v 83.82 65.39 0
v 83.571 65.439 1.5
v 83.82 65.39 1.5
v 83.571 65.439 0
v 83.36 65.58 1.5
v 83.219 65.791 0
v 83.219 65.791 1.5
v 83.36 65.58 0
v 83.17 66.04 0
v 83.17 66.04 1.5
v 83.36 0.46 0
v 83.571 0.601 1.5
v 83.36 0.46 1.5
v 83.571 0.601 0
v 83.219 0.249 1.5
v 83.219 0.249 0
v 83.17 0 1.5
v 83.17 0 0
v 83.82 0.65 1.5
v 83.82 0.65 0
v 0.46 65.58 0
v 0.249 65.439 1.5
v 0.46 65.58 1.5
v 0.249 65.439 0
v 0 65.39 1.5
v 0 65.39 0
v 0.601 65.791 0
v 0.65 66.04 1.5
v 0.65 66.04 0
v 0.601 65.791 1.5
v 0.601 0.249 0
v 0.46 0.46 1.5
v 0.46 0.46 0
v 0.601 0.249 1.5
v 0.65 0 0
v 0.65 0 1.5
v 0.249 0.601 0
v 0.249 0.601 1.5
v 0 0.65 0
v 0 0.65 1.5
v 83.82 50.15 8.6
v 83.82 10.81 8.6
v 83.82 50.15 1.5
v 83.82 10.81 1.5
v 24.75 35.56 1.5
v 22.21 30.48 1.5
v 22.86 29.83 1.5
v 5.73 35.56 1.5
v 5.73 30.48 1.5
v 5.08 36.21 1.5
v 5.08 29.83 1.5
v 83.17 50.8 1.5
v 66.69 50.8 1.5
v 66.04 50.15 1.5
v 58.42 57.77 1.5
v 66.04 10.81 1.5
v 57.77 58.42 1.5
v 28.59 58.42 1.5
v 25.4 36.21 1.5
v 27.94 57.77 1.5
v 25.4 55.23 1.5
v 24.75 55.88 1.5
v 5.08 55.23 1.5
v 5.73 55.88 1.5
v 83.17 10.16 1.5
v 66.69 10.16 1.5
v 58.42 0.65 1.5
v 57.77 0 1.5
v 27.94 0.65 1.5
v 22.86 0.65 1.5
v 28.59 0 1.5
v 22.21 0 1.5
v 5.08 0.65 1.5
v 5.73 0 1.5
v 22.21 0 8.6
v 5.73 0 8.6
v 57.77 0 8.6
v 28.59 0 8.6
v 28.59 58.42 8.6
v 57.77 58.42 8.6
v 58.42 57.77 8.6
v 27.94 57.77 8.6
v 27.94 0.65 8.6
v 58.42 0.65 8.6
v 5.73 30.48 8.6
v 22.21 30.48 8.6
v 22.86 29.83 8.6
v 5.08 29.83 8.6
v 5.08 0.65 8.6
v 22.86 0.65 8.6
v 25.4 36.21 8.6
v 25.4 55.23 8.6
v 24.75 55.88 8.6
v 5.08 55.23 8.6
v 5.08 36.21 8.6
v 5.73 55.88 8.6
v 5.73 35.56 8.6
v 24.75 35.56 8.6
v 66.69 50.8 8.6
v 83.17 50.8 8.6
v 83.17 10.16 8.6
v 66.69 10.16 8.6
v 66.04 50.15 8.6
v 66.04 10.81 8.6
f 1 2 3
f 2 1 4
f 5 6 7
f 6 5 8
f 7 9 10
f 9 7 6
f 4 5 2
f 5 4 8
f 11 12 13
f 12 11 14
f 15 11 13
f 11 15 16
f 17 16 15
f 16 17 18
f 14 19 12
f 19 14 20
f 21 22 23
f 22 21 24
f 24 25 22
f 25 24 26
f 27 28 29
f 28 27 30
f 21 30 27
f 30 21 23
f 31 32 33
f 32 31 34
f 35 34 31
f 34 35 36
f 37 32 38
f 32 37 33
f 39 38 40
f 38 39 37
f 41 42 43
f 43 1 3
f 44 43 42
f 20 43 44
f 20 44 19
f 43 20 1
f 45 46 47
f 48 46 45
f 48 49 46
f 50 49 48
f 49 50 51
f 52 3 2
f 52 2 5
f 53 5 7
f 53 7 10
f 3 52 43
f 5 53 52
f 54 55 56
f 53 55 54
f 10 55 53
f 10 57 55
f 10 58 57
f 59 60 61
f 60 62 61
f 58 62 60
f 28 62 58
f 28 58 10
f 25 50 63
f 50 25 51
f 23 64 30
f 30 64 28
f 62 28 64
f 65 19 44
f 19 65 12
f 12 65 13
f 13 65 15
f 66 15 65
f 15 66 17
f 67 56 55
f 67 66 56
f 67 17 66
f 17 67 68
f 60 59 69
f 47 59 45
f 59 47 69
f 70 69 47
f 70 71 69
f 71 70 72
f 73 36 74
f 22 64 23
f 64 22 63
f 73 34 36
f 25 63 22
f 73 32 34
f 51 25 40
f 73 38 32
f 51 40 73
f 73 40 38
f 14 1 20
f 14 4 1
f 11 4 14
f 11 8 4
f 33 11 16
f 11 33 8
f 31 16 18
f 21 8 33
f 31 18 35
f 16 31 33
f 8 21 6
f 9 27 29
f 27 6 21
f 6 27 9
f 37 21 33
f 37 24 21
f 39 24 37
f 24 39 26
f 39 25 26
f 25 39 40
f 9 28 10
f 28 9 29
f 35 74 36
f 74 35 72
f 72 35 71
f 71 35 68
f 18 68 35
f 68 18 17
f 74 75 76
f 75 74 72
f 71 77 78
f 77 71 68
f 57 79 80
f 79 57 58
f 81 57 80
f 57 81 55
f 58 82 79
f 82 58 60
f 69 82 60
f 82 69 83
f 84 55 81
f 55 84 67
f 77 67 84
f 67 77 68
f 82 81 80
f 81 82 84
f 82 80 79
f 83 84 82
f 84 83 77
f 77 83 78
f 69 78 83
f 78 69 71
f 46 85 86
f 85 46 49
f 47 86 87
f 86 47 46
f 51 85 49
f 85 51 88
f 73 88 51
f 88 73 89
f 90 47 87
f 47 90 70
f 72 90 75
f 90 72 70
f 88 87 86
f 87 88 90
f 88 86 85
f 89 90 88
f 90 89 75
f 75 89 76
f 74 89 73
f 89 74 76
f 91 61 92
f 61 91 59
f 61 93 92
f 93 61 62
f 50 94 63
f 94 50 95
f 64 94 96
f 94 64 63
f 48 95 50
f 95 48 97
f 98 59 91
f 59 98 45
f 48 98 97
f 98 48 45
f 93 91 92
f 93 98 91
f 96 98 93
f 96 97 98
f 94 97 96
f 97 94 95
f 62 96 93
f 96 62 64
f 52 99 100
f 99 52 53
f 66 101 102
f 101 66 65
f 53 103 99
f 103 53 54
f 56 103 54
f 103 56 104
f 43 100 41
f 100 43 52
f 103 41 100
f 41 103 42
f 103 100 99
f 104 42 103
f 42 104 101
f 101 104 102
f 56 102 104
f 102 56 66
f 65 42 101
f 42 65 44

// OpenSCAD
// file: libraries/electronics.scad
/**
 * getPointSize
 * @returns Point size (mil)
 */
function getPointSize() = 2.54;


/**
 * getSizeFromPointCount
 * @returns dimension in milimeters from points numbers
 */
function getSizeFromPointCount(point_count) = (point_count + 1) * getPointSize();
// file: pieces/subpieces/breadboard.scad
use <../../libraries/electronics.scad>

module breadboard(
    x_points,
    y_points,
    z_size = 1.5,
    throw_3mm_coord_list = [],
    draw_throws = true,
    center = false,
    $fn = $fn
) {
    throw_diameter = 1.3;

    x_size = getSizeFromPointCount(x_points);
    y_size = getSizeFromPointCount(y_points);

    module _breadboard() {
        difference() {
            color("DarkOrange")
                cube([x_size, y_size, z_size], center = false);

            if (draw_throws) {
                for (x_index = [0 : x_points + 1]) {
                    for (y_index = [0 : y_points + 1]) {
                        breadboardThrow(x_index, y_index, z_size, throw_diameter, $fn = $fn);
                    }
                }
            } else {
                breadboardThrow(x_points + 1, y_points + 1, z_size, throw_diameter, $fn = $fn);
                breadboardThrow(x_points + 1, 0, z_size, throw_diameter, $fn = $fn);
                breadboardThrow(0, y_points + 1, z_size, throw_diameter, $fn = $fn);
                breadboardThrow(0, 0, z_size, throw_diameter, $fn = $fn);
            }

            for (throw_3mm_coord = throw_3mm_coord_list) {
                breadboardThrow(throw_3mm_coord[0], throw_3mm_coord[1], z_size, 3, $fn = $fn);
            }

        }
    }

    if (center) {
        translate([-x_size / 2, -y_size / 2, -z_size / 2])
            _breadboard();
    } else {
        _breadboard();
    }
}


module translateBreadboard(x, y, z = 0) {
    translate([x * getPointSize(), y * getPointSize(), z])
        children();
}


module breadboardThrow(x_index, y_index, z_size, throw_diameter, $fn = $fn) {
    translateBreadboard(x_index, y_index, -z_size / 2)
        cylinder(
            h = z_size * 2,
            d = throw_diameter,
            $fn = $fn
        );
}


module genericModule(
    z_size = 0,
    x_points = 0,
    y_points = 0,
    color = "FireBrick"
) {
    color(color)
        hull() {
            breadboard(
                x_points = x_points,
                y_points = y_points,
                z_size = z_size,
                draw_throws = false,
                $fn = 16
            );
        }
}
// main file
use <./pieces/subpieces/breadboard.scad>
use <./libraries/electronics.scad>



module motherBoard() {



    module dacModule() {
        x_points = 7;
        y_points = 7;

        support_z_size = 0; // 2.5

        color("Green")
        translate([0, 0, support_z_size])
            hull() {
                breadboard(
                    x_points = x_points,
                    y_points = y_points,
                    z_size = 7.1 - support_z_size,
                    draw_throws = false,
                    $fn = 16
                );
            }

    }



    module sdCardModule() {
        x_points = 6;
        y_points = 11;

        support_z_size = 0; // 2.5

        color("Green")
        translate([0, 0, support_z_size])
            hull() {
                breadboard(
                    x_points = x_points,
                    y_points = y_points,
                    z_size = 7.1 - support_z_size,
                    draw_throws = false,
                    $fn = 16
                );
            }
    }



    module esp32s3() {

        y_points = 22;
        x_points = 11;

        support_z_size = 0; // 2.5

        color("Green")
        translate([0, 0, support_z_size])
            hull() {
                breadboard(
                    x_points = x_points,
                    y_points = y_points,
                    z_size = 7.1 - support_z_size,
                    draw_throws = false,
                    $fn = 16
                );
            }
    }


    module dc2dc() {

        x_points = 6;
        y_points = 15;

        support_z_size = 0; // 2.5

        color("Green")
        translate([0, 0, support_z_size])
            hull() {
                breadboard(
                    x_points = x_points,
                    y_points = y_points,
                    z_size = 7.1 - support_z_size,
                    draw_throws = false,
                    $fn = 16
                );
            }
    }


    breadboard(
        x_points = 32,
        y_points = 25,
        draw_throws = false,
        $fn = 16
    );

    translate([0, 0, 1.5]) {
        translateBreadboard(11, 0)
            esp32s3();

        translateBreadboard(2, 0)
            sdCardModule();

        translateBreadboard(2, 14)
            dacModule();

        translateBreadboard(26, 4)
            dc2dc();     
    }
}


motherBoard();
